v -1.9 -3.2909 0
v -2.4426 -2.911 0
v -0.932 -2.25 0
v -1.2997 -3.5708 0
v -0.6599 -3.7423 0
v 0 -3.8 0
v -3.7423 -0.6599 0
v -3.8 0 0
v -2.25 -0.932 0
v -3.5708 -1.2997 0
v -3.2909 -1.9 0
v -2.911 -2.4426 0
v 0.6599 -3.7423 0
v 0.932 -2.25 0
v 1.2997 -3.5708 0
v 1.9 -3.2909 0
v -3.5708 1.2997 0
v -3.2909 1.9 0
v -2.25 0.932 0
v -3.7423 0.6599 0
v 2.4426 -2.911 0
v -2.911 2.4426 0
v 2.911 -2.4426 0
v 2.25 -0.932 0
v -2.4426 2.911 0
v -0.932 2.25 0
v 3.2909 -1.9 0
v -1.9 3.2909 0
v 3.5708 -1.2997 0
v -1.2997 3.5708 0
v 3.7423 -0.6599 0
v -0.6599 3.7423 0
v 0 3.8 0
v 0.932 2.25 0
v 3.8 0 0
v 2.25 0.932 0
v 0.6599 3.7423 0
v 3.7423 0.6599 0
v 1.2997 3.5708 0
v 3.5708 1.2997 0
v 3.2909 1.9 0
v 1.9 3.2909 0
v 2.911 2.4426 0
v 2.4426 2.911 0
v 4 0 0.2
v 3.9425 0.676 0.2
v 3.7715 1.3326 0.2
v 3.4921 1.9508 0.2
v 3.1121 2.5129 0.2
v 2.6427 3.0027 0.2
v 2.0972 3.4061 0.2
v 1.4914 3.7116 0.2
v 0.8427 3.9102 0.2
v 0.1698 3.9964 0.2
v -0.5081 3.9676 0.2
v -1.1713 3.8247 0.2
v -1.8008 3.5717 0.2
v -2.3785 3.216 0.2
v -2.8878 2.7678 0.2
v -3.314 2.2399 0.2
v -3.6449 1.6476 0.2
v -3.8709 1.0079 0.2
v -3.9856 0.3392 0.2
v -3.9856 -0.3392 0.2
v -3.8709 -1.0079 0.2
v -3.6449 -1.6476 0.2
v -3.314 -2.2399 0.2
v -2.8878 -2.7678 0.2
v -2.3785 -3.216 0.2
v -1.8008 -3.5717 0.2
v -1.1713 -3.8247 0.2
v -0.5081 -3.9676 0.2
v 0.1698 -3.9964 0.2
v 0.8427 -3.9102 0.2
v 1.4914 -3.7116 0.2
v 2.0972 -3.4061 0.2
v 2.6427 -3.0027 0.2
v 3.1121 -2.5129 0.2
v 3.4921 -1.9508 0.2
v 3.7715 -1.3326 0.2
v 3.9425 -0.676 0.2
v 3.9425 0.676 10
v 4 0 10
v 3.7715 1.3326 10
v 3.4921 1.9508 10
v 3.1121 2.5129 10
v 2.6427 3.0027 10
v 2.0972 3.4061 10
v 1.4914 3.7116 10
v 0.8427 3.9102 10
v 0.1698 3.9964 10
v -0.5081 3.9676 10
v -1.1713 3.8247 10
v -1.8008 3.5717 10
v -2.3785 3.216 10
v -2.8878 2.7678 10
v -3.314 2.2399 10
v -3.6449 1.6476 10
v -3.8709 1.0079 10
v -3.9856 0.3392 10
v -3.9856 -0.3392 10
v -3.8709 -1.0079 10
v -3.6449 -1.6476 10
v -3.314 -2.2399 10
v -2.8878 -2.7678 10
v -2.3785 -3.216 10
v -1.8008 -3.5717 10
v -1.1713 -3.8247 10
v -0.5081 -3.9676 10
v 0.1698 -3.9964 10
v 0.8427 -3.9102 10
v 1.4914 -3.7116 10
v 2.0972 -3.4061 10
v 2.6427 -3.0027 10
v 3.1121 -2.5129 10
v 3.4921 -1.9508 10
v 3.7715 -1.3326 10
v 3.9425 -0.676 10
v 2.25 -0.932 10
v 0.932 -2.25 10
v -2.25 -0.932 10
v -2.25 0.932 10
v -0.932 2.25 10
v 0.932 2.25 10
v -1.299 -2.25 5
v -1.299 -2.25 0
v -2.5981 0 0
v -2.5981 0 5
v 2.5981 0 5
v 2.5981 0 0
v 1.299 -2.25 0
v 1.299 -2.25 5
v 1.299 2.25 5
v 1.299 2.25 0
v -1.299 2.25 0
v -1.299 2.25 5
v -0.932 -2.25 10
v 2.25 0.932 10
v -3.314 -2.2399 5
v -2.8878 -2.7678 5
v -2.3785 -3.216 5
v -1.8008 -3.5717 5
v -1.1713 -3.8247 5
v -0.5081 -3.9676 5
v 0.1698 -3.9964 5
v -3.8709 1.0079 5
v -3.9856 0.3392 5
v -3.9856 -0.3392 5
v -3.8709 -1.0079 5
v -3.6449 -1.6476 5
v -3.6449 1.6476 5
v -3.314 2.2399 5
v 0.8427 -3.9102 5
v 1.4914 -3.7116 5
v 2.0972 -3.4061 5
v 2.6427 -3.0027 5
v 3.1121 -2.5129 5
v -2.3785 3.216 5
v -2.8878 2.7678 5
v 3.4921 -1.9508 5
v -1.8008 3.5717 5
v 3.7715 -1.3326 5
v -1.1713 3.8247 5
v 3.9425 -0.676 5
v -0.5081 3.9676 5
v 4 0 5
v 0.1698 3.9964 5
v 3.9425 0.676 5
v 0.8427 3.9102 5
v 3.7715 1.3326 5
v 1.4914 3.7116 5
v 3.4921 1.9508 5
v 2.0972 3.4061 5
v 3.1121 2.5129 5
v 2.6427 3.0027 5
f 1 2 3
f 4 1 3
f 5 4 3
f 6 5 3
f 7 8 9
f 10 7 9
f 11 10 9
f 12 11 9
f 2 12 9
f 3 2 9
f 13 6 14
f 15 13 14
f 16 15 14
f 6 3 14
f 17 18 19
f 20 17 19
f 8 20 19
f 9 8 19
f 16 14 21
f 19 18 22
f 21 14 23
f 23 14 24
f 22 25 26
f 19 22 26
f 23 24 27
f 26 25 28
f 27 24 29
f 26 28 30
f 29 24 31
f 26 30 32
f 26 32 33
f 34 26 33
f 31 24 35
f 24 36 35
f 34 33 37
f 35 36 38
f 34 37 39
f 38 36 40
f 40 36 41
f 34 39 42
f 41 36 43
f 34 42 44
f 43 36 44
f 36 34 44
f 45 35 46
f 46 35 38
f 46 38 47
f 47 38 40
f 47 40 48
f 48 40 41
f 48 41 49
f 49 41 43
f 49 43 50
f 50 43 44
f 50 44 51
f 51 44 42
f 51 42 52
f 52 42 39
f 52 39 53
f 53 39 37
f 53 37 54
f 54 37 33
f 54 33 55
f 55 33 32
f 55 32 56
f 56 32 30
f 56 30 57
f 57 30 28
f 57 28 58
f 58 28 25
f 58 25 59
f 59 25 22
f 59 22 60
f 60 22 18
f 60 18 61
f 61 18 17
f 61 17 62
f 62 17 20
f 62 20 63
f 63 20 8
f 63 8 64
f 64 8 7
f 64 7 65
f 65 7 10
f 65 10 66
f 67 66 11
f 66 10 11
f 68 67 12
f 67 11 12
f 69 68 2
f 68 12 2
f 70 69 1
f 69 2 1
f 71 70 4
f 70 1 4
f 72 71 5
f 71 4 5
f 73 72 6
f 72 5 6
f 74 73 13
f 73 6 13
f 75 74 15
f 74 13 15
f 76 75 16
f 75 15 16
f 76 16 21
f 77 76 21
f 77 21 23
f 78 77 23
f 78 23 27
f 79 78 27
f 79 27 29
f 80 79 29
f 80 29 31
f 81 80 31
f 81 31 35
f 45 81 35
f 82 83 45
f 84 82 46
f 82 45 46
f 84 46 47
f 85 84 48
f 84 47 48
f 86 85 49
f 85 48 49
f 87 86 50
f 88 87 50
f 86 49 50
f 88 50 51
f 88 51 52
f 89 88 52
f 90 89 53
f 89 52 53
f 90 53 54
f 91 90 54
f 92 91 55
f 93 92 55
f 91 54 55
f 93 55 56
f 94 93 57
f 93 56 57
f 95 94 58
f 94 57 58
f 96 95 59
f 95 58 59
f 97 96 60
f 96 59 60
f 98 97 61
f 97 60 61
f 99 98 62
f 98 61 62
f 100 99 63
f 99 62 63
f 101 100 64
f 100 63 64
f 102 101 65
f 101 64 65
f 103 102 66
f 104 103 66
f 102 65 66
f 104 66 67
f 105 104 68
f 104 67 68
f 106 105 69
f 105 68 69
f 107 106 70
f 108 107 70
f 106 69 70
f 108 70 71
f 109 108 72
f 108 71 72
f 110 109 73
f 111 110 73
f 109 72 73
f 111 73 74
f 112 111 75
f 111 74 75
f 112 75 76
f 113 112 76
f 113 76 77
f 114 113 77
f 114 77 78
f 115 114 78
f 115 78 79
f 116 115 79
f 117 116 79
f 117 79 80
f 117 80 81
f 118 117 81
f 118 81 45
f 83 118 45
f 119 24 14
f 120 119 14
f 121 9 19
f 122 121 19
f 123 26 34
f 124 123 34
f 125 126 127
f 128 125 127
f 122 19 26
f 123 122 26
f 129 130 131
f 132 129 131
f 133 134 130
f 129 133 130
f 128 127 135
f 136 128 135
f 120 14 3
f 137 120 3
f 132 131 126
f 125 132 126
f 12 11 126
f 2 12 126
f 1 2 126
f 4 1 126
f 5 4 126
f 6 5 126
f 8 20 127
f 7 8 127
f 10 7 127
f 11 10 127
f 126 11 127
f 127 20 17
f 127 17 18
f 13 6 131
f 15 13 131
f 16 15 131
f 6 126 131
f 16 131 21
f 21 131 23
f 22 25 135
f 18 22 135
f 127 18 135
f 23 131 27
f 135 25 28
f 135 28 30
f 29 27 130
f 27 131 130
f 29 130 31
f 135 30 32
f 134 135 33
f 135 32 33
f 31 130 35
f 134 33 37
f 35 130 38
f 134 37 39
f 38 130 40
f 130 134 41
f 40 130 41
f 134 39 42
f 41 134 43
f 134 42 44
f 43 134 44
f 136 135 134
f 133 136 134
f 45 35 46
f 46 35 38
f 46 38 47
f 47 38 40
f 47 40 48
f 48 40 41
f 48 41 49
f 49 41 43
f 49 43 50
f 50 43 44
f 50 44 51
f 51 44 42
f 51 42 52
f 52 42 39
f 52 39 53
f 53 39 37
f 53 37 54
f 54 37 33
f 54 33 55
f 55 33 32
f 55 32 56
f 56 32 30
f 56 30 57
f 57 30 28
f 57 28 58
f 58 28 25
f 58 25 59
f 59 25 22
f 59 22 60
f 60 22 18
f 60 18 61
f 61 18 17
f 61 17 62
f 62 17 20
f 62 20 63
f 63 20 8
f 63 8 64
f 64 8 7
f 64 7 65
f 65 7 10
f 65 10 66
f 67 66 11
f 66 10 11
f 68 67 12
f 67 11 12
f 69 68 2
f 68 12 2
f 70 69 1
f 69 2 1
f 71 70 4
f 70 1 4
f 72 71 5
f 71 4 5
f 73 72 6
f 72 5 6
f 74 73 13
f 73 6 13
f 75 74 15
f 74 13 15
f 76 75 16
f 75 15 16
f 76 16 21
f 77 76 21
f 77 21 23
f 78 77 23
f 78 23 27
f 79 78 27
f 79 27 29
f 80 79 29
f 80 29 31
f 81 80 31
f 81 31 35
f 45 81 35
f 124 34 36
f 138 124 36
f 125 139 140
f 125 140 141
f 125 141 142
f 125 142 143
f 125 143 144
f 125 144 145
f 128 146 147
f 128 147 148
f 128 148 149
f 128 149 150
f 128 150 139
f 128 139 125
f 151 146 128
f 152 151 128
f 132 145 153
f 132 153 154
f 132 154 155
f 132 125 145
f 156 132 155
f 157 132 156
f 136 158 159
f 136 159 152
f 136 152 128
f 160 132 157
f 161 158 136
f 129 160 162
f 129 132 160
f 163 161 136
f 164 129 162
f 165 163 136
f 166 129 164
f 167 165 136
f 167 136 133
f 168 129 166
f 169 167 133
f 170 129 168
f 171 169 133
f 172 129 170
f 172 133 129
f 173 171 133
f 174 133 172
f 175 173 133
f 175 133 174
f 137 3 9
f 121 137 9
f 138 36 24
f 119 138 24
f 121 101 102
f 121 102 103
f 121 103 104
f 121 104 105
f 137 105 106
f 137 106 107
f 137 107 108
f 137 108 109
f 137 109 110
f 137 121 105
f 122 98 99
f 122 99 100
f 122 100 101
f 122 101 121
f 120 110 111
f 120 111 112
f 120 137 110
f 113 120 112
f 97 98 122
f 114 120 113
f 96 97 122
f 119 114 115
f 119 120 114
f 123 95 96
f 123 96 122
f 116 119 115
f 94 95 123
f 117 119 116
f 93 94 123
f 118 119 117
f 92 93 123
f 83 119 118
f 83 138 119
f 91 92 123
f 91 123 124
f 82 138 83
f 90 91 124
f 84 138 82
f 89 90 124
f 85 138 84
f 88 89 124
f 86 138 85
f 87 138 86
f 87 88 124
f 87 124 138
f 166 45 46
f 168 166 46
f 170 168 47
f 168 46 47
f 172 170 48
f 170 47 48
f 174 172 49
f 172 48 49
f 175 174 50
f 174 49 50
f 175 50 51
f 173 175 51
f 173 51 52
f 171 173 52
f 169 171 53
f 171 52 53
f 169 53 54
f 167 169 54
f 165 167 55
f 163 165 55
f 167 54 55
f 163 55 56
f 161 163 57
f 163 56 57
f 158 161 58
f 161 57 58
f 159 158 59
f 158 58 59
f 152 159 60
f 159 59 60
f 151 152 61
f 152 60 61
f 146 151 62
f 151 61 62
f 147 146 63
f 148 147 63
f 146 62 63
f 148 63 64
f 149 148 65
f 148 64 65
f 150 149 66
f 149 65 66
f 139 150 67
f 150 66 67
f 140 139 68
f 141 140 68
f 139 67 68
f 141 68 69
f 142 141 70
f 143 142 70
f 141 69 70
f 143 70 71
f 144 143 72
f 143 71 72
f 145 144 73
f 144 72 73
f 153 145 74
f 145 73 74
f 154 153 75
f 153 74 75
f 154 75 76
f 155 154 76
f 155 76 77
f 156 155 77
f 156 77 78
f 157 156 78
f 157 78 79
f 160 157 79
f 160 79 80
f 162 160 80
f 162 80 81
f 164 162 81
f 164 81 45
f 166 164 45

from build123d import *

# Parameters (mm, degrees)
F0_R     = 4
F1_DEPTH = 5
F2_R     = 4
F3_DEPTH = 10
F4_SIZE  = 0.2
F5_SIZE  = 0.2


with BuildPart() as f1:
    # F0 (on Top) → F1 (new body)
    with BuildSketch(Plane.XY):
        Circle(F0_R)
        Polygon((2.598076, 0), (1.299038, -2.25), (-1.299038, -2.25), (-2.598076, 0), (-1.299038, 2.25), (1.299038, 2.25), align=None, mode=Mode.SUBTRACT)
    extrude(amount=F1_DEPTH)

    # F4
    f4_edges = [f1.edges().sort_by_distance(p)[0] for p in [
        (-4, 0, 0),
    ]]
    chamfer(f4_edges, length=F4_SIZE)


with BuildPart() as f3:
    # F2 (on Top) → F3 (new body)
    with BuildSketch(Plane.XY):
        Circle(F2_R)
        Polygon((2.25, -0.931981), (0.931981, -2.25), (-0.931981, -2.25), (-2.25, -0.931981), (-2.25, 0.931981), (-0.931981, 2.25), (0.931981, 2.25), (2.25, 0.931981), align=None, mode=Mode.SUBTRACT)
    extrude(amount=F3_DEPTH)

    # F5
    f5_edges = [f3.edges().sort_by_distance(p)[0] for p in [
        (-4, 0, 0),
    ]]
    chamfer(f5_edges, length=F5_SIZE)


solid = Compound([f1.part, f3.part])
